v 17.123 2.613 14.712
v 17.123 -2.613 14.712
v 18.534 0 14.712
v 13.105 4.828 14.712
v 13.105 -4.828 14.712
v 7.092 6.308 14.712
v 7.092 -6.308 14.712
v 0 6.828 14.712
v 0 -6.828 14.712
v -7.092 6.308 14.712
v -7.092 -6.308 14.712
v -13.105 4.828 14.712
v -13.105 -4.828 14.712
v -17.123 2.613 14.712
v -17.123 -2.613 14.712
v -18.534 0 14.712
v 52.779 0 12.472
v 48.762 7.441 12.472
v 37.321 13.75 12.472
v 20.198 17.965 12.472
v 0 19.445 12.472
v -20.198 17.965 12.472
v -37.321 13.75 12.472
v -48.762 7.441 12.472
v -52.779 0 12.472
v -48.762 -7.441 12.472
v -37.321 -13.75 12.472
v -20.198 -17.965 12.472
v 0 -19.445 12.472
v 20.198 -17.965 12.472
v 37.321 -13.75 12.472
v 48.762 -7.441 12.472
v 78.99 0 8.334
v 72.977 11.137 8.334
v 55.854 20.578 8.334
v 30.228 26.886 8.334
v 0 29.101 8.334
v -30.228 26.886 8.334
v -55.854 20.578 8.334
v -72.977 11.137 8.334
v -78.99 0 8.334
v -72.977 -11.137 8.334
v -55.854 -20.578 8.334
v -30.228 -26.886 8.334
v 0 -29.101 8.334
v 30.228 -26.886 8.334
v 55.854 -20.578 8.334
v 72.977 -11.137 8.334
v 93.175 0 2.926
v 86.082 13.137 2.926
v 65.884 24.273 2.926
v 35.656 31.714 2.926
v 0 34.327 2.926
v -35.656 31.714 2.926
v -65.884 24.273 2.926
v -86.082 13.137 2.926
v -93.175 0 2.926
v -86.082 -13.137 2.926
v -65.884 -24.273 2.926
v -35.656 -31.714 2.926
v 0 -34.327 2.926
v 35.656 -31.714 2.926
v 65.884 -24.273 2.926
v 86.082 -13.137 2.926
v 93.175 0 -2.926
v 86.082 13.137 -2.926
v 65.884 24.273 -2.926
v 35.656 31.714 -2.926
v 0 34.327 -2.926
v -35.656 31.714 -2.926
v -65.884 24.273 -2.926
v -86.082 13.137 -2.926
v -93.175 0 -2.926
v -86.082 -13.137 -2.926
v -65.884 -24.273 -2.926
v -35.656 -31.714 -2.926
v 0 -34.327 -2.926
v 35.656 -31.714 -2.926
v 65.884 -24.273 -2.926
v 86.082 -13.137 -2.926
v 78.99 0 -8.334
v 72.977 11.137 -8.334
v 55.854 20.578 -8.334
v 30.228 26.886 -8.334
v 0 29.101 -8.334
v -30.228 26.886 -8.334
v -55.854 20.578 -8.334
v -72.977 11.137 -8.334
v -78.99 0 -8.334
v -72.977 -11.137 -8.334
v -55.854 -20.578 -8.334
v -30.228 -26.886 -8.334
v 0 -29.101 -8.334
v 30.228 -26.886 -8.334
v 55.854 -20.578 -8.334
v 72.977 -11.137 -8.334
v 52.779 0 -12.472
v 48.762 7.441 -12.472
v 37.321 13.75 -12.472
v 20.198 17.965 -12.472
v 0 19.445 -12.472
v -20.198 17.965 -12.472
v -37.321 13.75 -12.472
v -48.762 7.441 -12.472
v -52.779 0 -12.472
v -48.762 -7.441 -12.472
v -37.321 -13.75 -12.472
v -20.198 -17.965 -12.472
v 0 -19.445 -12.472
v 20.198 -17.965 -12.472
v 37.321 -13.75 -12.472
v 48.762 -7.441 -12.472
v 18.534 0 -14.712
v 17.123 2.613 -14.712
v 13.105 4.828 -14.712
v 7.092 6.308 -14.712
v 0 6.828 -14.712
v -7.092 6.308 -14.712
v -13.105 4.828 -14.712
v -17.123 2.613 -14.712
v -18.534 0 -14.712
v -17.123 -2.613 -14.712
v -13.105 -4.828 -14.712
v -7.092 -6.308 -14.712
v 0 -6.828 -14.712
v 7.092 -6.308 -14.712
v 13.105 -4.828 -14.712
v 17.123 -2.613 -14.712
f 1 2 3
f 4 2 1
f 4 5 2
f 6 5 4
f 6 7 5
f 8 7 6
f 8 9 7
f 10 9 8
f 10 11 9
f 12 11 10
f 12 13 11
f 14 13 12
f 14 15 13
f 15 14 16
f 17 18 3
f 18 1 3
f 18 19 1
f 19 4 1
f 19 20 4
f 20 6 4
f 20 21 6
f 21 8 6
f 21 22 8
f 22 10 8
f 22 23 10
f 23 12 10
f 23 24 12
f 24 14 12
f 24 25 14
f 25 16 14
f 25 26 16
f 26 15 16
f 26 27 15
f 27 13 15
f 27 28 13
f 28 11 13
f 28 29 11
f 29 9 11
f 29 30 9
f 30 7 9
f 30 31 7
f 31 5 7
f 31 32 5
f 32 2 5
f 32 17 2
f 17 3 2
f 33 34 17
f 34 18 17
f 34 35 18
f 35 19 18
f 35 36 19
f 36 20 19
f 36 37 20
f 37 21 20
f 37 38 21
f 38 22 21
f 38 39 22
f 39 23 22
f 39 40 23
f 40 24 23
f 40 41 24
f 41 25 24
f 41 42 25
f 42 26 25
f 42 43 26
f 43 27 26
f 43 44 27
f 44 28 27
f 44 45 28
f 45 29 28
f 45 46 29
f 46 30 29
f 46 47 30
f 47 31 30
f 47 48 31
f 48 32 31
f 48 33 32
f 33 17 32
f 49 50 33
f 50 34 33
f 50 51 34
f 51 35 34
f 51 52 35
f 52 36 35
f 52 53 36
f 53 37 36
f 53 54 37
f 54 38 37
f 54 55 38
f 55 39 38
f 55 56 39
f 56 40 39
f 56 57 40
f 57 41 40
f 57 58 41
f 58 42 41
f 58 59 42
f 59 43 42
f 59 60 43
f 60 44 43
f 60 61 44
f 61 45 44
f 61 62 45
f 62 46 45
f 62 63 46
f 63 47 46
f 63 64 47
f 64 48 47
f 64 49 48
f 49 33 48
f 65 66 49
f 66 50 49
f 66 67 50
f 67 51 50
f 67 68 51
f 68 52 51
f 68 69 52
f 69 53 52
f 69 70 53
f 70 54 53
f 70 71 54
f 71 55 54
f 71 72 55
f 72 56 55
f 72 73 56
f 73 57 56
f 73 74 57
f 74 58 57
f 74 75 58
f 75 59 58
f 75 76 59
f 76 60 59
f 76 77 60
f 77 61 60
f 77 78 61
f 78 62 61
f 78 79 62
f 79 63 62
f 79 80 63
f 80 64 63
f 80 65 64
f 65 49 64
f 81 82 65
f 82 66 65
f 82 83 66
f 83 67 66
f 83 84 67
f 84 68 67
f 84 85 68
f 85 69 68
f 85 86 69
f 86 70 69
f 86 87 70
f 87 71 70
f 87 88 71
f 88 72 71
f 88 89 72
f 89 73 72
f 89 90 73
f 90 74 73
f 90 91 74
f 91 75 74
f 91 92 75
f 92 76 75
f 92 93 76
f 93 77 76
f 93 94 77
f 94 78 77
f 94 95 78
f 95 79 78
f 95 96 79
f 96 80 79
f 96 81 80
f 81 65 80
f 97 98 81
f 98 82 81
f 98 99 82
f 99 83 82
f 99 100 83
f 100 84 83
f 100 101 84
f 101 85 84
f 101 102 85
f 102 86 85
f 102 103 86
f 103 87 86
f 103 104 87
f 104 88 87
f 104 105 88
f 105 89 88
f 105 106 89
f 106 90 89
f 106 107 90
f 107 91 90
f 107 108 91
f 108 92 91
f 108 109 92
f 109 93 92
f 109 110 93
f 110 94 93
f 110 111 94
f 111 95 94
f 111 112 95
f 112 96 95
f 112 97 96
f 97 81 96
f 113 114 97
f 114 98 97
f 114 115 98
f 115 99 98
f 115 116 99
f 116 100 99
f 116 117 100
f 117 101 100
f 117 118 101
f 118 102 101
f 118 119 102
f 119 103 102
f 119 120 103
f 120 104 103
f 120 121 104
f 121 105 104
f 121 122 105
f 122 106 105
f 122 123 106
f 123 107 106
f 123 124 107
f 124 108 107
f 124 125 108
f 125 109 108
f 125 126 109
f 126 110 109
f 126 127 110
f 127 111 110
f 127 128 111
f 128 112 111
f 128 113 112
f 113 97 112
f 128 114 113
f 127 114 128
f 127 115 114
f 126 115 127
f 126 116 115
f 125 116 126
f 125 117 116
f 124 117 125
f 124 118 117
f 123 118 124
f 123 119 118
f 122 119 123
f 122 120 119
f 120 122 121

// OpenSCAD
// Generated by SolidPython 1.0.1 on 2020-07-29 00:46:53


scale(v = [19, 7, 3]) {
	sphere(r = 5);
}
/***********************************************
*********      SolidPython code:      **********
************************************************
 
# import packages: SolidPython
from solid import *
from solid.utils import *
from itertools import chain, combinations, permutations


class Resize:

    def __init__(self, scad_file):
        self.scad_file = scad_file
        #self.scad_file = import_scad(scad_file)
        # cone/cylinder param:
        self.r1 = 0
        self.r2 = 0
        self.h = 0
        # rectangular prism param:
        self.w = 0
        self.l = 0
        # ellipse param:
        self.r = 0

    # import OpenScad code (file name corresponds to shape)


    # classify shape + parameters
    def assign(self, param1, param2, param3):
        if self.scad_file == 'cone.scad':
            self.r1 = param1
            self.r2 = param2
            self.h = param3
        elif self.scad_file == 'cylinder.scad':
            self.r1 = param1
            self.r2 = param2
            self.h = param3
        elif self.scad_file == 'rectangularPrism.scad':
            self.h = param1
            self.l = param2
            self.w = param3
        else:
            self.r = param1
            self.h = param2

    # resize parameters
    def iterate(self):
        x = range(3, 20, 2)
        i = 1
        if self.scad_file == 'cone.scad':
            tempList = list(permutations(x, 2))
            for temp in tempList:
                param1 = temp[0]
                param2 = temp[1]
                filepath = 'produced_scad_files/' + 'cone' + str(param1) + '_' + str(param2) + '_' + '.scad'
                scad_render_to_file(cylinder(h=param1, r1=param2, r2=0), filepath)

        elif self.scad_file == 'cylinder.scad':
            tempList = list(permutations(x, 3))
            for temp in tempList:
                param1 = temp[0]
                param2 = temp[1]
                filepath = 'produced_scad_files/' + 'cylinder' + str(param1) + '_' + str(param2) + '_' + '.scad'
                scad_render_to_file(cylinder(h=param1, r1=param2, r2=param2), filepath)

        elif self.scad_file == 'rectangularPrism.scad':
            tempList = list(permutations(x, 3))
            for temp in tempList:
                param1 = temp[0]
                param2 = temp[1]
                param3 = temp[2]
                filepath = 'produced_scad_files/' + 'rectangularPrism' + str(param1) + '_' + str(param2) + '_' + str(
                    param3) + '.scad'
                scad_render_to_file(cube(size=(param1, param2, param3)), filepath)

        elif self.scad_file == 'ellipse.scad':
            tempList = list(permutations(x, 4))
            for temp in tempList:
                param1 = temp[0]
                param2 = temp[1]
                param3 = temp[2]
                param4 = temp[3]
                filepath = 'produced_scad_files/' + 'ellipse' + str(param1) + '_' + str(param2) + '_' + str(param3) + '_' + str(param4) + '.scad'
                scad_render_to_file(scale([param1, param2, param3])(sphere(r=param4)), filepath)

    def render_to_scadfile(self):
        scad_render_to_file(scad, 'example.scad') 
 
************************************************/
